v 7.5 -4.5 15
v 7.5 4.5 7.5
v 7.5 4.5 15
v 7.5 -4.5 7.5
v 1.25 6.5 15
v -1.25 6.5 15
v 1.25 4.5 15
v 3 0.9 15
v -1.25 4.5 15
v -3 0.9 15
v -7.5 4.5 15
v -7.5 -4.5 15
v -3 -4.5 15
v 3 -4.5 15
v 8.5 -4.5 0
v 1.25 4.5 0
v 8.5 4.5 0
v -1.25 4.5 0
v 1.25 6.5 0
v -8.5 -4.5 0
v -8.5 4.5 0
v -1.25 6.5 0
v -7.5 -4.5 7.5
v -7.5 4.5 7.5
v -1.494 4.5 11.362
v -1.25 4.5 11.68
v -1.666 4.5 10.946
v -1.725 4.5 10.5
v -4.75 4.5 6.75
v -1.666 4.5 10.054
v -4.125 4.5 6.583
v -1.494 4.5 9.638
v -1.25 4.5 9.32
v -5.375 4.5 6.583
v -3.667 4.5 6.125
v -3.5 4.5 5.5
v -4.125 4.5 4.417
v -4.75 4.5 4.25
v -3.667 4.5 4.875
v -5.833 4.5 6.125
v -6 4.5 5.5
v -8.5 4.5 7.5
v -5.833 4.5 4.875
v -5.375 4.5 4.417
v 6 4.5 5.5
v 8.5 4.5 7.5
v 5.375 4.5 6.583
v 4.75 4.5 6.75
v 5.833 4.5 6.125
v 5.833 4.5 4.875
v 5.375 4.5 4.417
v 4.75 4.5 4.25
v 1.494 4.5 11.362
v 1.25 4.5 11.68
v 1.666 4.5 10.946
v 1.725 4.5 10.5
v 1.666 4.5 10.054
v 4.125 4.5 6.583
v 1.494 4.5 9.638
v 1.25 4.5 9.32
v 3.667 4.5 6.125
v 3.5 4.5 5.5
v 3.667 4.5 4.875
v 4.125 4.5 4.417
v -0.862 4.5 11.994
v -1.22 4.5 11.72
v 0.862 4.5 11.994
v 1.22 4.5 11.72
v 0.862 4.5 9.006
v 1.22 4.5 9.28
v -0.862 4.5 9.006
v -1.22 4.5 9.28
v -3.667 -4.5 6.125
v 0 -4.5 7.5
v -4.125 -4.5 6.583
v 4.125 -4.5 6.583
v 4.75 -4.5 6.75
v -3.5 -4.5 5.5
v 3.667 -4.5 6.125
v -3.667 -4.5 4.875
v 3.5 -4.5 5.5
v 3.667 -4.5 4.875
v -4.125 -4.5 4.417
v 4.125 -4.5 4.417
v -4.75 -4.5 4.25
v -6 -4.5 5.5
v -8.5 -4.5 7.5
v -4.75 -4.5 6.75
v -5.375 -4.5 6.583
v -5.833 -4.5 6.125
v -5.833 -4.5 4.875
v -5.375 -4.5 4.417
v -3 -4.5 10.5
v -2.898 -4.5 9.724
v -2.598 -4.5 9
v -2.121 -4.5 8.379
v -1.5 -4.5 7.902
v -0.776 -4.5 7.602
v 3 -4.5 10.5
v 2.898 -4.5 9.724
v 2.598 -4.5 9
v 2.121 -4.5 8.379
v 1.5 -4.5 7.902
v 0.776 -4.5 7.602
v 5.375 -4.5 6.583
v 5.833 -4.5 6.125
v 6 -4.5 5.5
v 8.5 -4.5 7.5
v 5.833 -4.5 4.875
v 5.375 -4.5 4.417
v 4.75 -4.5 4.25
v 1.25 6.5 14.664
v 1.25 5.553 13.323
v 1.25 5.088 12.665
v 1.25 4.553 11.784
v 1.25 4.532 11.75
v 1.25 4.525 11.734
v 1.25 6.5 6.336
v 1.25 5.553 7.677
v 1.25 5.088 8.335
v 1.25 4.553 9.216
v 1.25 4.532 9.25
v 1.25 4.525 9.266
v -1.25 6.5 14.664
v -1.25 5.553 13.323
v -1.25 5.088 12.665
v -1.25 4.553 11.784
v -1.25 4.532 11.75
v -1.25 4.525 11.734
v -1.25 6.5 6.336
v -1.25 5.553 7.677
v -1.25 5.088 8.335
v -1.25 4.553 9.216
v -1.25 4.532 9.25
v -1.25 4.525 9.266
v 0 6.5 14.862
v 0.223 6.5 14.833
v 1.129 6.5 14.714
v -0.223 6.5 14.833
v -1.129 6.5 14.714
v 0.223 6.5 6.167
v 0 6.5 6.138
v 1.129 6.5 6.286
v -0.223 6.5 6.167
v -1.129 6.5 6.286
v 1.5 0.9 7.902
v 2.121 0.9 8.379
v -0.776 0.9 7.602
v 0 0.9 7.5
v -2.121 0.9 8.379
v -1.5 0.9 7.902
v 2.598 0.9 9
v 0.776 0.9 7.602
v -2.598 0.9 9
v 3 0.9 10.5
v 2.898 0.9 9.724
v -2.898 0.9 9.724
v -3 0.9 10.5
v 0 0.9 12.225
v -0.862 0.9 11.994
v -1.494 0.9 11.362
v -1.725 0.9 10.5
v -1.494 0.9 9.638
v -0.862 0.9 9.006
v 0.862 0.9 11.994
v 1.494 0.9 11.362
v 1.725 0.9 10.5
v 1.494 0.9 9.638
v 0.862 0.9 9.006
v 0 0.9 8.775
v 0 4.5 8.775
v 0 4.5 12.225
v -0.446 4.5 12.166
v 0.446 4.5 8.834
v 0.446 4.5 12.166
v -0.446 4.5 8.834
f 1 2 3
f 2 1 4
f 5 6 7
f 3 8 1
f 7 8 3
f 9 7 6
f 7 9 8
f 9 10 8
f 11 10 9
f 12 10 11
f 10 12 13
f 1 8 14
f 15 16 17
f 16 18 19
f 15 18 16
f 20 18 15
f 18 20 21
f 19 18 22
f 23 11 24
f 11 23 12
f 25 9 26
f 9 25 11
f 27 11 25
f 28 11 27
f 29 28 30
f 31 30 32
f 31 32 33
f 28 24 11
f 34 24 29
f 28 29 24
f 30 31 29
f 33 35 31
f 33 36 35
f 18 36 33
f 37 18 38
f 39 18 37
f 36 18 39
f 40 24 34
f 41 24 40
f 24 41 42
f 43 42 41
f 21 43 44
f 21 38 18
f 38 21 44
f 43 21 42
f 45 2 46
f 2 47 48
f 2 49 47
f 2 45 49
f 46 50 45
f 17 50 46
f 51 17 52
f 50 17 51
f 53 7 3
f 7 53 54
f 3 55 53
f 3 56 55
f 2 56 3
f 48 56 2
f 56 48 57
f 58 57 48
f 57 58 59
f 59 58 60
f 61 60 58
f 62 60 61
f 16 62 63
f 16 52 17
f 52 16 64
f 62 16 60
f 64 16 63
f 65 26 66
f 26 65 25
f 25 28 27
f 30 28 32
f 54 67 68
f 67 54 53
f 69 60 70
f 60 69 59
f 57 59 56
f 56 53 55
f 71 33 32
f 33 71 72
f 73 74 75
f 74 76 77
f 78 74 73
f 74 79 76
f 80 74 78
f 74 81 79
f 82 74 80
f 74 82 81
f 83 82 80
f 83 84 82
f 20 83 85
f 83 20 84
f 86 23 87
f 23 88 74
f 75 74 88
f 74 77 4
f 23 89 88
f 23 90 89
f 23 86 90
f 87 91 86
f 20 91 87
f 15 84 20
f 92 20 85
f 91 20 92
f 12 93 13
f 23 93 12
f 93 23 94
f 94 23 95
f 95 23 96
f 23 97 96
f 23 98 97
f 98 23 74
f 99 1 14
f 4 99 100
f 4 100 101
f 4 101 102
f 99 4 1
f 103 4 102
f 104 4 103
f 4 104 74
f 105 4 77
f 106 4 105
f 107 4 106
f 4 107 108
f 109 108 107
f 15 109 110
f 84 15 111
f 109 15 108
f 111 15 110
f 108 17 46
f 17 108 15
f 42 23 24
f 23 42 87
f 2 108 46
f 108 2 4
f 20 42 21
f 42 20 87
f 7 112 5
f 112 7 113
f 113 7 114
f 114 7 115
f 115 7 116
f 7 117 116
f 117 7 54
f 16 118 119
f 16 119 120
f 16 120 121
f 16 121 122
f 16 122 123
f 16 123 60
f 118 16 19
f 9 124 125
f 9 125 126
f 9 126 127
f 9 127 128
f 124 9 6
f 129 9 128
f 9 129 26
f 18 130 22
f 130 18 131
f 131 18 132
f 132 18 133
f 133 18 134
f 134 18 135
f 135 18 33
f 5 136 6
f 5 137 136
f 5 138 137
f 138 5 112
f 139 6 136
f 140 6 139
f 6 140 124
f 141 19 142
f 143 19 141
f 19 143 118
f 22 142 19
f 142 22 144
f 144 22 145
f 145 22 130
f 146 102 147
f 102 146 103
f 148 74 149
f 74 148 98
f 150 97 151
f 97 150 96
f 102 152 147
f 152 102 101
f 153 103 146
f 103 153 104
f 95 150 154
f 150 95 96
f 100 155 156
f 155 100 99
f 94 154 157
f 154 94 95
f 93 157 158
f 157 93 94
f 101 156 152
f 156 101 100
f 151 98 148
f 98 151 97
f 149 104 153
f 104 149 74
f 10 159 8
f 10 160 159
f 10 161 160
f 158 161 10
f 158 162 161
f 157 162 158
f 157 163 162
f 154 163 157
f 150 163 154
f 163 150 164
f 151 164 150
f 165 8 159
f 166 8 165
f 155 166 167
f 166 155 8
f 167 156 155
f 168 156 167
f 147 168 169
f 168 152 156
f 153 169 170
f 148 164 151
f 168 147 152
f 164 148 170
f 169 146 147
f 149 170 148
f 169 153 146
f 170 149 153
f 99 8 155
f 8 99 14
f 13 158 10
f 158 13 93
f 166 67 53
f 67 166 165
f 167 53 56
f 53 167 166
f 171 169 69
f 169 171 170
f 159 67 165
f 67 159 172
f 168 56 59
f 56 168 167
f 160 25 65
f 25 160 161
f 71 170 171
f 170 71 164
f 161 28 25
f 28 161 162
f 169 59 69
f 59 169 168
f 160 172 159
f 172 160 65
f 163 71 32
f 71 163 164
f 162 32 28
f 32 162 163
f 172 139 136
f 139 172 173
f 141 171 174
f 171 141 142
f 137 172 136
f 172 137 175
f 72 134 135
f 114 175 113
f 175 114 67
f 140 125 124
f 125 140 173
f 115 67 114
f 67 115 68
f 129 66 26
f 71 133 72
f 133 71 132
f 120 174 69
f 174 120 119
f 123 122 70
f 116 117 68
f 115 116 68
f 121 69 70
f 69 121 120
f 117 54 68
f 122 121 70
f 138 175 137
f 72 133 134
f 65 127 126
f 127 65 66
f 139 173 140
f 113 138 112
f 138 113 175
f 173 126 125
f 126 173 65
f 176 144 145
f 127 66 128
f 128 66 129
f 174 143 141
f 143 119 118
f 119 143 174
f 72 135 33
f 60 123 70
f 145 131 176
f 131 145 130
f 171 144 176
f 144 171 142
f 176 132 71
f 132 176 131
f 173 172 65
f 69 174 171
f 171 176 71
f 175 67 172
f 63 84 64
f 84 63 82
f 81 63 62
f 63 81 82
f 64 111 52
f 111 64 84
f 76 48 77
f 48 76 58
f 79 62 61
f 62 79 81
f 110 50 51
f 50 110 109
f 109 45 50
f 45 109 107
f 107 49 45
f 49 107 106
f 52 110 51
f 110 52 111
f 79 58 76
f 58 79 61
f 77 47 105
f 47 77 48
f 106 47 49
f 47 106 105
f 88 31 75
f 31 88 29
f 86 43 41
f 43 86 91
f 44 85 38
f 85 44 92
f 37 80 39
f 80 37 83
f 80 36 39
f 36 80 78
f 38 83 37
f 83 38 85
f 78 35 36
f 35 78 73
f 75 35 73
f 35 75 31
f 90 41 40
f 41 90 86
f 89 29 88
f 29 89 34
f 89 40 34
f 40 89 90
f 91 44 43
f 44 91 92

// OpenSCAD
// file: microswitch.scad
// Don't print this file, purchase real micro switches
// e.g. Honeywell ZM10B10A01 or OMRON SS-5 or similar.

module microswitch() {
  difference() {
    union() {
      translate([0, 0, 2.5])
        cube([19.8, 6, 10], center=true);
      translate([2.5, 0.5, 6])
        cube([2, 3.5, 5], center=true);
      for (x = [-8, -1, 8]) {
        translate([x, 0, 0])
          cube([0.6, 3.2, 13], center=true);
      }
    }
    for (x = [-9.5/2, 9.5/2]) {
      translate([x, 0, 0]) rotate([90, 0, 0])
        cylinder(r=2.5/2, h=20, center=true, $fn=12);
    }
  }
}

microswitch();
// file: configuration.scad
// Increase this if your slicer or printer make holes too tight.
extra_radius = 0.1;

// OD = outside diameter, corner to corner.
m3_nut_od = 6.1;
m3_nut_radius = m3_nut_od/2 + 0.2 + extra_radius;
m3_washer_radius = 3.5 + extra_radius;

// Major diameter of metric 3mm thread.
m3_major = 2.85;
m3_radius = m3_major/2 + extra_radius;
m3_wide_radius = m3_major/2 + extra_radius + 0.2;

// NEMA17 stepper motors.
motor_shaft_diameter = 5;
motor_shaft_radius = motor_shaft_diameter/2 + extra_radius;

// Frame brackets. M3x8mm screws work best with 3.6 mm brackets.
thickness = 3.6;

// OpenBeam or Misumi. Currently only 15x15 mm, but there is a plan
// to make models more parametric and allow 20x20 mm in the future.
extrusion = 15;

// Placement for the NEMA17 stepper motors.
motor_offset = 44;
motor_length = 47;
// main file
include <configuration.scad>;

use <microswitch.scad>;

thickness = 9;  // 1mm thicker than linear rail.
width = 15;  // Same as vertical extrusion.
height = 15;

module endstop() {
  difference() {
    union() {
      cube([width, thickness, height], center=true);
      translate([0, 0, -height/4])
        cube([width+2, thickness, height/2], center=true);
      translate([0, 2, 0])
        cube([2.5, thickness, height], center=true);
    }
    translate([0, 0, 3]) rotate([90, 0, 0]) {
      cylinder(r=m3_wide_radius, h=20, center=true, $fn=12);
      translate([0, 0, 3.6-thickness/2]) {
        cylinder(r=3, h=10, $fn=24);
        translate([0, 5, 5])
          cube([6, 10, 10], center=true);
      }
      translate([0, 0, -thickness/2]) scale([1, 1, -1])
        cylinder(r1=m3_wide_radius, r2=7, h=4, $fn=24);
    }
    translate([0, -3-thickness/2, -2]) rotate([0, 180, 0]) {
      % microswitch();
      for (x = [-9.5/2, 9.5/2]) {
        translate([x, 0, 0]) rotate([90, 0, 0])
          cylinder(r=2.5/2, h=40, center=true, $fn=12);
      }
    }
  }
}

translate([0, 0, height/2]) endstop();
